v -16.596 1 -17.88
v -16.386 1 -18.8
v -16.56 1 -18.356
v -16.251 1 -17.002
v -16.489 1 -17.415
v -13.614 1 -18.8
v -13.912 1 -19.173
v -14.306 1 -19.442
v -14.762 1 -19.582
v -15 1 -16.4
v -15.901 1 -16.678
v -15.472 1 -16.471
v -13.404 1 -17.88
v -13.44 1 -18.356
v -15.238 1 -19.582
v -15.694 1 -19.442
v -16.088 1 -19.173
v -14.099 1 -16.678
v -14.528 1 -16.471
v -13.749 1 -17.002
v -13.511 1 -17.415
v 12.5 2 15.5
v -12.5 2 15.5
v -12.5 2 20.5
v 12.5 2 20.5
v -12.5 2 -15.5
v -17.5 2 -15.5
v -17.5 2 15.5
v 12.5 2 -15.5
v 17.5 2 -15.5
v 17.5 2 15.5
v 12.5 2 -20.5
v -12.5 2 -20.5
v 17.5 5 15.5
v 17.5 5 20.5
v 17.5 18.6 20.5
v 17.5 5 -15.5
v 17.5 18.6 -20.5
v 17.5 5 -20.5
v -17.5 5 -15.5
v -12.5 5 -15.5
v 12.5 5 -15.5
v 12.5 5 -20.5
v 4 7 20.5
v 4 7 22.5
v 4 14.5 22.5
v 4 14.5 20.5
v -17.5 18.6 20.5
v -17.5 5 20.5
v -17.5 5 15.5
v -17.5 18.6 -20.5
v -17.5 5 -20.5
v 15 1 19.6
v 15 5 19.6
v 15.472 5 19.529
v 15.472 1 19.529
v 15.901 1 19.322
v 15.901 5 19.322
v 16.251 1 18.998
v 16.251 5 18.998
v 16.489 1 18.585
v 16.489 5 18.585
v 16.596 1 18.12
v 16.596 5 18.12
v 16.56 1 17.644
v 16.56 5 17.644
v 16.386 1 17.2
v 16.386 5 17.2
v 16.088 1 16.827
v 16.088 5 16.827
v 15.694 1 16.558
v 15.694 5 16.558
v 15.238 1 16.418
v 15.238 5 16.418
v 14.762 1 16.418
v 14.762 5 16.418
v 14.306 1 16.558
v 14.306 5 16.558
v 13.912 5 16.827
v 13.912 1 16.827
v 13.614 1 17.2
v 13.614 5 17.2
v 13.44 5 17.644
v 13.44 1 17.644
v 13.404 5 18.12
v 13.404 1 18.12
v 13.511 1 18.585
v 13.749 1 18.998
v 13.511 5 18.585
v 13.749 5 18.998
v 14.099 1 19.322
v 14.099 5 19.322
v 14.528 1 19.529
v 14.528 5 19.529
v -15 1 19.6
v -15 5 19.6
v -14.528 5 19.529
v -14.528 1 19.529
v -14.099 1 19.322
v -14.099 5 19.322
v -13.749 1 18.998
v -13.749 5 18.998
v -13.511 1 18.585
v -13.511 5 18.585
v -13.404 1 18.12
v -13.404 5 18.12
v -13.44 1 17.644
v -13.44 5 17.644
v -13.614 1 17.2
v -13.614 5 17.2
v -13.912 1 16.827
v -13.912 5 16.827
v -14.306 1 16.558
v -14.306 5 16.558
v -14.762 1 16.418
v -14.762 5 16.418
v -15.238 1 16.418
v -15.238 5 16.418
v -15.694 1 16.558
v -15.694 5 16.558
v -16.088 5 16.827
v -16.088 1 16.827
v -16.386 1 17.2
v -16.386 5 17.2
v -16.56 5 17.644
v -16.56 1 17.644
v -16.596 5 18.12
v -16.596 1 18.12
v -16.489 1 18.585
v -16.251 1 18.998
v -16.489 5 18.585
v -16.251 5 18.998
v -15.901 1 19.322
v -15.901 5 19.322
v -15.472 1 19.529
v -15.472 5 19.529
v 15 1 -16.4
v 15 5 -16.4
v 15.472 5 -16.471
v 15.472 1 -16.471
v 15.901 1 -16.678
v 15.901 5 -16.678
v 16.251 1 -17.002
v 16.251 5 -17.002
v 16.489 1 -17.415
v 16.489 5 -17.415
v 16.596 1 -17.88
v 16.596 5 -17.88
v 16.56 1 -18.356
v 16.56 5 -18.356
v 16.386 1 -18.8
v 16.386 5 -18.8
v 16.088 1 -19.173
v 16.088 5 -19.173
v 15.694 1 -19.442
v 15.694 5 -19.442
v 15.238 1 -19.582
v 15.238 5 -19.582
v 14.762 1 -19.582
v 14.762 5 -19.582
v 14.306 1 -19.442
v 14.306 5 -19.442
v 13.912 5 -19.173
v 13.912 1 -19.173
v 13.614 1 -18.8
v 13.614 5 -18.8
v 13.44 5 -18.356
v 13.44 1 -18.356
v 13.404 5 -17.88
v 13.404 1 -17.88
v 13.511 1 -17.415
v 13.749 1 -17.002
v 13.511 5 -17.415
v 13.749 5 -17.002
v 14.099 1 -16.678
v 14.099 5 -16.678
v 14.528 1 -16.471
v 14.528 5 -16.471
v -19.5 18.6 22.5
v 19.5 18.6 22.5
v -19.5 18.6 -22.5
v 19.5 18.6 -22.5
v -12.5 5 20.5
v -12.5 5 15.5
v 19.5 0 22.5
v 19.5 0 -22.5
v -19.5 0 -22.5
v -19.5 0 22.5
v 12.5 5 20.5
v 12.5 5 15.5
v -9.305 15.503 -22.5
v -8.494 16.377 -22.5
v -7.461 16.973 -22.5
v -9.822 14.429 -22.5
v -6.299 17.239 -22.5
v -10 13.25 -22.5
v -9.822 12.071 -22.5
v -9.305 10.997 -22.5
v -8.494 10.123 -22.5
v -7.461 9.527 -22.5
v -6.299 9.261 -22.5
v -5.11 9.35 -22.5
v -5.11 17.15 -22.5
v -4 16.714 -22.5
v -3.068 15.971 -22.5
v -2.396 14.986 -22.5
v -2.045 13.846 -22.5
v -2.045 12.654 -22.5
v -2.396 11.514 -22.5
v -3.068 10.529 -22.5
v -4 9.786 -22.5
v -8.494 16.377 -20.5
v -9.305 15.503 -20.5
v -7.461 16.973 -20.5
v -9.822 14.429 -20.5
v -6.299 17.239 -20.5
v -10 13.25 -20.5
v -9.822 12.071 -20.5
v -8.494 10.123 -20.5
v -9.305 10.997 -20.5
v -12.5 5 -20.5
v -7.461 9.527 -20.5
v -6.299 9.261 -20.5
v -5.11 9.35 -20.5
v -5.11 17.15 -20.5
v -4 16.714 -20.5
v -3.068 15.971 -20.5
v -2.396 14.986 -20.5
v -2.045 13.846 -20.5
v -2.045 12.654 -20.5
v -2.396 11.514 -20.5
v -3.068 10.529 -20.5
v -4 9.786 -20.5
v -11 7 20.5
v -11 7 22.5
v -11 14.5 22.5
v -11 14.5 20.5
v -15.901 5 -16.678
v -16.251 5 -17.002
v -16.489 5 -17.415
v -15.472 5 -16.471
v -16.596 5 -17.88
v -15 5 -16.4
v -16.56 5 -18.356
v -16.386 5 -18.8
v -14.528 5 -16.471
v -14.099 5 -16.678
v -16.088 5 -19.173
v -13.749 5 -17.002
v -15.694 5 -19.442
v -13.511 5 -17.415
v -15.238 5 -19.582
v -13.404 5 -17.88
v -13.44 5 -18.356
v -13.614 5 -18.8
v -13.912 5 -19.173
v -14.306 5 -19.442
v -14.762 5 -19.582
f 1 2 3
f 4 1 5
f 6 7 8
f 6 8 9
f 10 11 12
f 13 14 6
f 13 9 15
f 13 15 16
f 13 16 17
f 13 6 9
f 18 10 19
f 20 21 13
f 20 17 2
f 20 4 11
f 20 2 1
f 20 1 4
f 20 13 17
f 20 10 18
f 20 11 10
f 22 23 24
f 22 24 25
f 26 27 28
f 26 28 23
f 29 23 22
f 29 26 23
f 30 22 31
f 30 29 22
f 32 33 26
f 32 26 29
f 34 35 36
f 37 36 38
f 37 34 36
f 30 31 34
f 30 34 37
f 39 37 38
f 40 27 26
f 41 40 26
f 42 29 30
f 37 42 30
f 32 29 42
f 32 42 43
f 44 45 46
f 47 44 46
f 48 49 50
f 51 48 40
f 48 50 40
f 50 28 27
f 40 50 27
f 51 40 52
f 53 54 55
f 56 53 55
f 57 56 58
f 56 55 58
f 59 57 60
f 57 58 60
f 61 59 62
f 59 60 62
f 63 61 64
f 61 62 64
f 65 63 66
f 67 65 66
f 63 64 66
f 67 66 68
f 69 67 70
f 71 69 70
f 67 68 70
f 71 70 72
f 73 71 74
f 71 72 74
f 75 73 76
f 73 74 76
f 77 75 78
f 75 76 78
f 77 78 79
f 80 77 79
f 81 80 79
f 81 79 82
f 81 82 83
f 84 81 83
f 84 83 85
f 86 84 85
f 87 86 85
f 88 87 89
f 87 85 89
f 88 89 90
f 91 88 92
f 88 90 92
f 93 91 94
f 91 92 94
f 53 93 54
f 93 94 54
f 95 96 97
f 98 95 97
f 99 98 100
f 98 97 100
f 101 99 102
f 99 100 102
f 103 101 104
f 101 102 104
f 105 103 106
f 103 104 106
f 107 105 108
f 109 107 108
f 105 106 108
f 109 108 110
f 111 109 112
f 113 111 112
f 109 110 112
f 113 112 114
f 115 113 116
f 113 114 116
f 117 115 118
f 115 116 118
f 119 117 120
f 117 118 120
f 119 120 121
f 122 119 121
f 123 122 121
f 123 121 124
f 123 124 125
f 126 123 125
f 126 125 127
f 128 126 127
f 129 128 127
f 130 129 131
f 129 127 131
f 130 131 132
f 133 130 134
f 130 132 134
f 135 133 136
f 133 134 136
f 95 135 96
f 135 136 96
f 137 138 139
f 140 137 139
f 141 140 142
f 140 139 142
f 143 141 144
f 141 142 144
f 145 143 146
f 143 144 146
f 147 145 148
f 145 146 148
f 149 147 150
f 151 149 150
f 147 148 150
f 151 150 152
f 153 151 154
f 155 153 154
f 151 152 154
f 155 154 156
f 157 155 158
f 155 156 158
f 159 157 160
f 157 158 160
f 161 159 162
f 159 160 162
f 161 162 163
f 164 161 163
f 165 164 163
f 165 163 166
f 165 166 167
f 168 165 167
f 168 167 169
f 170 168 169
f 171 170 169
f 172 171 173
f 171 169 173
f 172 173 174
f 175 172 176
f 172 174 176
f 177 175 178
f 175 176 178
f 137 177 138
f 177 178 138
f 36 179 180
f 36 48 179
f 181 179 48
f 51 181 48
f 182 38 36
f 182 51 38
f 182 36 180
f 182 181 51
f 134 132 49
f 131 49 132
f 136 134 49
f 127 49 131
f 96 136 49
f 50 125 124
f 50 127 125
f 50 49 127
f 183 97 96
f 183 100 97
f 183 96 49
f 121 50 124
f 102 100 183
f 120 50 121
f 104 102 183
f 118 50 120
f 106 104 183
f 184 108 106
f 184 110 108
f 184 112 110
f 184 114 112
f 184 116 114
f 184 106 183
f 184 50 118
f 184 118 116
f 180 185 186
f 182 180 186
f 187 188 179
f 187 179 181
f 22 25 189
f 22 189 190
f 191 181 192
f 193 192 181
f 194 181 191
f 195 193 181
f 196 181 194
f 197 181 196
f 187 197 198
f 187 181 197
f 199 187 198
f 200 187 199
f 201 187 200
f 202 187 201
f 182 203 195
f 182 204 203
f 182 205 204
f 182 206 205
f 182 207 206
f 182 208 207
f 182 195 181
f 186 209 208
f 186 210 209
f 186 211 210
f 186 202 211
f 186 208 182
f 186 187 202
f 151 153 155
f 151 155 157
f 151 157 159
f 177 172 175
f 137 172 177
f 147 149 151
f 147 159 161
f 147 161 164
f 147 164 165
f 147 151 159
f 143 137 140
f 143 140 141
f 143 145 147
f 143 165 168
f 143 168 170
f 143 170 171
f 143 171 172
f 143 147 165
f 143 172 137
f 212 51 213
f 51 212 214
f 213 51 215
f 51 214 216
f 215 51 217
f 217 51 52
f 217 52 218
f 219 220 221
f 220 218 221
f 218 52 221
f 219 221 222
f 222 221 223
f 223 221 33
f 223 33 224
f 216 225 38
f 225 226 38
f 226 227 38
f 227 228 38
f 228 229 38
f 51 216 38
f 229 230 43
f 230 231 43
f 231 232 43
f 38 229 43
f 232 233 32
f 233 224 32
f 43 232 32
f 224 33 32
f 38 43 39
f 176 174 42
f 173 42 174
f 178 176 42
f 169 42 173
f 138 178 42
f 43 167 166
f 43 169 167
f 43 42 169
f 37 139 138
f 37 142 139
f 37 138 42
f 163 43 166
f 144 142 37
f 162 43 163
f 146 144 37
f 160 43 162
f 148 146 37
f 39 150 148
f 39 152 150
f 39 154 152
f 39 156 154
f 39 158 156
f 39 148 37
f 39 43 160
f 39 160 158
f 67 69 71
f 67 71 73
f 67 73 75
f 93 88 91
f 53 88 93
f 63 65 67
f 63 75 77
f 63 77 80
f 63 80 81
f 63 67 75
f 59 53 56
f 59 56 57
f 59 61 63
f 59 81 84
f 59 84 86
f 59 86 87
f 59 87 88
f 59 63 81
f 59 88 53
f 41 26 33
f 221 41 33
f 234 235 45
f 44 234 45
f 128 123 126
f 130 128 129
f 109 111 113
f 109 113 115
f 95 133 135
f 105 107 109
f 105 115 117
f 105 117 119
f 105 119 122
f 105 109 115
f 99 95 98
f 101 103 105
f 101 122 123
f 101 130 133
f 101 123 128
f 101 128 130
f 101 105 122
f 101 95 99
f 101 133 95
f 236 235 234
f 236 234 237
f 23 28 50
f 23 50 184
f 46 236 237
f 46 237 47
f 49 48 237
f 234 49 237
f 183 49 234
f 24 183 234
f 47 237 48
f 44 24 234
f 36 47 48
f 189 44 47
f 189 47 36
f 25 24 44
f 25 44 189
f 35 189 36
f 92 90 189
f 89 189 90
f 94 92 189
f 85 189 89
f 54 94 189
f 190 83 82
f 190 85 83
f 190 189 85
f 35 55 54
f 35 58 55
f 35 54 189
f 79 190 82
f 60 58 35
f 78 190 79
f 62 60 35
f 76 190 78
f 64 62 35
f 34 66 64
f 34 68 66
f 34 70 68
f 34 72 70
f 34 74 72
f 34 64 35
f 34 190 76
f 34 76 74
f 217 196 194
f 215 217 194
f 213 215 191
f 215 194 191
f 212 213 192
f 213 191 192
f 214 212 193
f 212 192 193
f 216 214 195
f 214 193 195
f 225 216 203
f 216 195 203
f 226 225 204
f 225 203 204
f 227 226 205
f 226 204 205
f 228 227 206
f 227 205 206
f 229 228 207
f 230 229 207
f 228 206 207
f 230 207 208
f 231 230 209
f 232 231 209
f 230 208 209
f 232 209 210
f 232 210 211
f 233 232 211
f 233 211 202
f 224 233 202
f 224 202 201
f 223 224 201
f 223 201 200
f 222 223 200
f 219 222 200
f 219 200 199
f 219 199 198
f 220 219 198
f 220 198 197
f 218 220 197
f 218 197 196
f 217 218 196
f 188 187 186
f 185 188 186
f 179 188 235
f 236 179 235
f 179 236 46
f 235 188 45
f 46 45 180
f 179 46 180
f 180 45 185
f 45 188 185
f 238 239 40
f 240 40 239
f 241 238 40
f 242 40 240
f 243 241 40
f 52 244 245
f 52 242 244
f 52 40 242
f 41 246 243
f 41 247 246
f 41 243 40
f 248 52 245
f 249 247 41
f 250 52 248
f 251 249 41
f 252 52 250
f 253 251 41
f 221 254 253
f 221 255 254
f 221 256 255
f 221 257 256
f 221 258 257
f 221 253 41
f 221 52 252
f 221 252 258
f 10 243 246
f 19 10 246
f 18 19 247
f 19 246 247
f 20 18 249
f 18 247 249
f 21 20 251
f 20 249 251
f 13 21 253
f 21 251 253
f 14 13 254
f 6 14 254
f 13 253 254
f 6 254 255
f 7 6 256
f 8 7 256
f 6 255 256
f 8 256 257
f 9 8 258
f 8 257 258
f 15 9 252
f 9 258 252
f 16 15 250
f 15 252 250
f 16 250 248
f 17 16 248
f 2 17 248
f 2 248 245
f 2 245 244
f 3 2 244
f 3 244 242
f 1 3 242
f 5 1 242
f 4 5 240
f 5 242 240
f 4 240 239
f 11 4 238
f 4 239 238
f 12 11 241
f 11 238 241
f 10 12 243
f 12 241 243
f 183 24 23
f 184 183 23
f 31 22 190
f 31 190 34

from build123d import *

# Parameters (mm, degrees)
SKETCH1_W             = 39
SKETCH1_H             = 45
BODY_DEPTH            = 18.6
SHELL1_T              = -2
SKETCH3_W             = 5
SKETCH3_H             = 5
INSERTS_SUPPORT_DEPTH = 3
SKETCH4_R             = 1.6
INSERTS_HOLES_DEPTH   = 4
USB_HOLE_REACH        = 54.452
SKETCH5_W             = 15
SKETCH5_H             = 7.5
JACK_HOLE_REACH       = 54.452
SKETCH6_R             = 4


with BuildPart() as part:
    # Sketch1 → Body (new body)
    with BuildSketch(Plane(origin=(0, 0, 0), x_dir=(1, 0, 0), z_dir=(0, 1, 0))):
        Rectangle(SKETCH1_W, SKETCH1_H)
    extrude(amount=BODY_DEPTH)

    # Shell1
    shell1_openings = [part.faces().sort_by_distance(p)[0] for p in [
        (0, 18.6, 0),
    ]]
    offset(amount=SHELL1_T, openings=shell1_openings, kind=Kind.INTERSECTION)

    # Sketch3 → Inserts_Support (add)
    with BuildSketch(Plane(origin=(0, 2, 0), x_dir=(1, 0, 0), z_dir=(0, 1, 0))):
        with Locations((-15, 18)):
            Rectangle(SKETCH3_W, SKETCH3_H)
        with Locations((15, 18)):
            Rectangle(SKETCH3_W, SKETCH3_H)
        with Locations((15, -18)):
            Rectangle(SKETCH3_W, SKETCH3_H)
        with Locations((-15, -18)):
            Rectangle(SKETCH3_W, SKETCH3_H)
    extrude(amount=INSERTS_SUPPORT_DEPTH)

    # Sketch4 → Inserts_Holes (cut)
    with BuildSketch(Plane(origin=(0, 5, 0), x_dir=(1, 0, 0), z_dir=(0, 1, 0))):
        with Locations(Location((-15, 18, 0), (0, 0, 270))):
            Circle(SKETCH4_R)
        with Locations(Location((15, 18, 0), (0, 0, 270))):
            Circle(SKETCH4_R)
        with Locations(Location((15, -18, 0), (0, 0, 270))):
            Circle(SKETCH4_R)
        with Locations(Location((-15, -18, 0), (0, 0, 270))):
            Circle(SKETCH4_R)
    extrude(amount=-INSERTS_HOLES_DEPTH, mode=Mode.SUBTRACT)

    # Sketch5 → USB_Hole (cut, up to next)
    with BuildSketch(Plane.XY.offset(22.5), mode=Mode.PRIVATE) as usb_hole_sk1:
        with Locations((-3.5, 10.75)):
            Rectangle(SKETCH5_W, SKETCH5_H)
    usb_hole_tool1 = extrude(usb_hole_sk1.sketch, amount=-USB_HOLE_REACH, mode=Mode.PRIVATE) & part.part
    add(usb_hole_tool1.solids().sort_by_distance((-3.5, 10.75, 22.5))[0], mode=Mode.SUBTRACT)

    # Sketch6 → Jack_Hole (cut, up to next)
    with BuildSketch(Plane(origin=(0, 0, -22.5), x_dir=(-1, 0, 0), z_dir=(0, 0, -1)), mode=Mode.PRIVATE) as jack_hole_sk1:
        with Locations((6, 13.25)):
            Circle(SKETCH6_R)
    jack_hole_tool1 = extrude(jack_hole_sk1.sketch, amount=-JACK_HOLE_REACH, mode=Mode.PRIVATE) & part.part
    add(jack_hole_tool1.solids().sort_by_distance((-6, 13.25, -22.5))[0], mode=Mode.SUBTRACT)


solid = part.part
